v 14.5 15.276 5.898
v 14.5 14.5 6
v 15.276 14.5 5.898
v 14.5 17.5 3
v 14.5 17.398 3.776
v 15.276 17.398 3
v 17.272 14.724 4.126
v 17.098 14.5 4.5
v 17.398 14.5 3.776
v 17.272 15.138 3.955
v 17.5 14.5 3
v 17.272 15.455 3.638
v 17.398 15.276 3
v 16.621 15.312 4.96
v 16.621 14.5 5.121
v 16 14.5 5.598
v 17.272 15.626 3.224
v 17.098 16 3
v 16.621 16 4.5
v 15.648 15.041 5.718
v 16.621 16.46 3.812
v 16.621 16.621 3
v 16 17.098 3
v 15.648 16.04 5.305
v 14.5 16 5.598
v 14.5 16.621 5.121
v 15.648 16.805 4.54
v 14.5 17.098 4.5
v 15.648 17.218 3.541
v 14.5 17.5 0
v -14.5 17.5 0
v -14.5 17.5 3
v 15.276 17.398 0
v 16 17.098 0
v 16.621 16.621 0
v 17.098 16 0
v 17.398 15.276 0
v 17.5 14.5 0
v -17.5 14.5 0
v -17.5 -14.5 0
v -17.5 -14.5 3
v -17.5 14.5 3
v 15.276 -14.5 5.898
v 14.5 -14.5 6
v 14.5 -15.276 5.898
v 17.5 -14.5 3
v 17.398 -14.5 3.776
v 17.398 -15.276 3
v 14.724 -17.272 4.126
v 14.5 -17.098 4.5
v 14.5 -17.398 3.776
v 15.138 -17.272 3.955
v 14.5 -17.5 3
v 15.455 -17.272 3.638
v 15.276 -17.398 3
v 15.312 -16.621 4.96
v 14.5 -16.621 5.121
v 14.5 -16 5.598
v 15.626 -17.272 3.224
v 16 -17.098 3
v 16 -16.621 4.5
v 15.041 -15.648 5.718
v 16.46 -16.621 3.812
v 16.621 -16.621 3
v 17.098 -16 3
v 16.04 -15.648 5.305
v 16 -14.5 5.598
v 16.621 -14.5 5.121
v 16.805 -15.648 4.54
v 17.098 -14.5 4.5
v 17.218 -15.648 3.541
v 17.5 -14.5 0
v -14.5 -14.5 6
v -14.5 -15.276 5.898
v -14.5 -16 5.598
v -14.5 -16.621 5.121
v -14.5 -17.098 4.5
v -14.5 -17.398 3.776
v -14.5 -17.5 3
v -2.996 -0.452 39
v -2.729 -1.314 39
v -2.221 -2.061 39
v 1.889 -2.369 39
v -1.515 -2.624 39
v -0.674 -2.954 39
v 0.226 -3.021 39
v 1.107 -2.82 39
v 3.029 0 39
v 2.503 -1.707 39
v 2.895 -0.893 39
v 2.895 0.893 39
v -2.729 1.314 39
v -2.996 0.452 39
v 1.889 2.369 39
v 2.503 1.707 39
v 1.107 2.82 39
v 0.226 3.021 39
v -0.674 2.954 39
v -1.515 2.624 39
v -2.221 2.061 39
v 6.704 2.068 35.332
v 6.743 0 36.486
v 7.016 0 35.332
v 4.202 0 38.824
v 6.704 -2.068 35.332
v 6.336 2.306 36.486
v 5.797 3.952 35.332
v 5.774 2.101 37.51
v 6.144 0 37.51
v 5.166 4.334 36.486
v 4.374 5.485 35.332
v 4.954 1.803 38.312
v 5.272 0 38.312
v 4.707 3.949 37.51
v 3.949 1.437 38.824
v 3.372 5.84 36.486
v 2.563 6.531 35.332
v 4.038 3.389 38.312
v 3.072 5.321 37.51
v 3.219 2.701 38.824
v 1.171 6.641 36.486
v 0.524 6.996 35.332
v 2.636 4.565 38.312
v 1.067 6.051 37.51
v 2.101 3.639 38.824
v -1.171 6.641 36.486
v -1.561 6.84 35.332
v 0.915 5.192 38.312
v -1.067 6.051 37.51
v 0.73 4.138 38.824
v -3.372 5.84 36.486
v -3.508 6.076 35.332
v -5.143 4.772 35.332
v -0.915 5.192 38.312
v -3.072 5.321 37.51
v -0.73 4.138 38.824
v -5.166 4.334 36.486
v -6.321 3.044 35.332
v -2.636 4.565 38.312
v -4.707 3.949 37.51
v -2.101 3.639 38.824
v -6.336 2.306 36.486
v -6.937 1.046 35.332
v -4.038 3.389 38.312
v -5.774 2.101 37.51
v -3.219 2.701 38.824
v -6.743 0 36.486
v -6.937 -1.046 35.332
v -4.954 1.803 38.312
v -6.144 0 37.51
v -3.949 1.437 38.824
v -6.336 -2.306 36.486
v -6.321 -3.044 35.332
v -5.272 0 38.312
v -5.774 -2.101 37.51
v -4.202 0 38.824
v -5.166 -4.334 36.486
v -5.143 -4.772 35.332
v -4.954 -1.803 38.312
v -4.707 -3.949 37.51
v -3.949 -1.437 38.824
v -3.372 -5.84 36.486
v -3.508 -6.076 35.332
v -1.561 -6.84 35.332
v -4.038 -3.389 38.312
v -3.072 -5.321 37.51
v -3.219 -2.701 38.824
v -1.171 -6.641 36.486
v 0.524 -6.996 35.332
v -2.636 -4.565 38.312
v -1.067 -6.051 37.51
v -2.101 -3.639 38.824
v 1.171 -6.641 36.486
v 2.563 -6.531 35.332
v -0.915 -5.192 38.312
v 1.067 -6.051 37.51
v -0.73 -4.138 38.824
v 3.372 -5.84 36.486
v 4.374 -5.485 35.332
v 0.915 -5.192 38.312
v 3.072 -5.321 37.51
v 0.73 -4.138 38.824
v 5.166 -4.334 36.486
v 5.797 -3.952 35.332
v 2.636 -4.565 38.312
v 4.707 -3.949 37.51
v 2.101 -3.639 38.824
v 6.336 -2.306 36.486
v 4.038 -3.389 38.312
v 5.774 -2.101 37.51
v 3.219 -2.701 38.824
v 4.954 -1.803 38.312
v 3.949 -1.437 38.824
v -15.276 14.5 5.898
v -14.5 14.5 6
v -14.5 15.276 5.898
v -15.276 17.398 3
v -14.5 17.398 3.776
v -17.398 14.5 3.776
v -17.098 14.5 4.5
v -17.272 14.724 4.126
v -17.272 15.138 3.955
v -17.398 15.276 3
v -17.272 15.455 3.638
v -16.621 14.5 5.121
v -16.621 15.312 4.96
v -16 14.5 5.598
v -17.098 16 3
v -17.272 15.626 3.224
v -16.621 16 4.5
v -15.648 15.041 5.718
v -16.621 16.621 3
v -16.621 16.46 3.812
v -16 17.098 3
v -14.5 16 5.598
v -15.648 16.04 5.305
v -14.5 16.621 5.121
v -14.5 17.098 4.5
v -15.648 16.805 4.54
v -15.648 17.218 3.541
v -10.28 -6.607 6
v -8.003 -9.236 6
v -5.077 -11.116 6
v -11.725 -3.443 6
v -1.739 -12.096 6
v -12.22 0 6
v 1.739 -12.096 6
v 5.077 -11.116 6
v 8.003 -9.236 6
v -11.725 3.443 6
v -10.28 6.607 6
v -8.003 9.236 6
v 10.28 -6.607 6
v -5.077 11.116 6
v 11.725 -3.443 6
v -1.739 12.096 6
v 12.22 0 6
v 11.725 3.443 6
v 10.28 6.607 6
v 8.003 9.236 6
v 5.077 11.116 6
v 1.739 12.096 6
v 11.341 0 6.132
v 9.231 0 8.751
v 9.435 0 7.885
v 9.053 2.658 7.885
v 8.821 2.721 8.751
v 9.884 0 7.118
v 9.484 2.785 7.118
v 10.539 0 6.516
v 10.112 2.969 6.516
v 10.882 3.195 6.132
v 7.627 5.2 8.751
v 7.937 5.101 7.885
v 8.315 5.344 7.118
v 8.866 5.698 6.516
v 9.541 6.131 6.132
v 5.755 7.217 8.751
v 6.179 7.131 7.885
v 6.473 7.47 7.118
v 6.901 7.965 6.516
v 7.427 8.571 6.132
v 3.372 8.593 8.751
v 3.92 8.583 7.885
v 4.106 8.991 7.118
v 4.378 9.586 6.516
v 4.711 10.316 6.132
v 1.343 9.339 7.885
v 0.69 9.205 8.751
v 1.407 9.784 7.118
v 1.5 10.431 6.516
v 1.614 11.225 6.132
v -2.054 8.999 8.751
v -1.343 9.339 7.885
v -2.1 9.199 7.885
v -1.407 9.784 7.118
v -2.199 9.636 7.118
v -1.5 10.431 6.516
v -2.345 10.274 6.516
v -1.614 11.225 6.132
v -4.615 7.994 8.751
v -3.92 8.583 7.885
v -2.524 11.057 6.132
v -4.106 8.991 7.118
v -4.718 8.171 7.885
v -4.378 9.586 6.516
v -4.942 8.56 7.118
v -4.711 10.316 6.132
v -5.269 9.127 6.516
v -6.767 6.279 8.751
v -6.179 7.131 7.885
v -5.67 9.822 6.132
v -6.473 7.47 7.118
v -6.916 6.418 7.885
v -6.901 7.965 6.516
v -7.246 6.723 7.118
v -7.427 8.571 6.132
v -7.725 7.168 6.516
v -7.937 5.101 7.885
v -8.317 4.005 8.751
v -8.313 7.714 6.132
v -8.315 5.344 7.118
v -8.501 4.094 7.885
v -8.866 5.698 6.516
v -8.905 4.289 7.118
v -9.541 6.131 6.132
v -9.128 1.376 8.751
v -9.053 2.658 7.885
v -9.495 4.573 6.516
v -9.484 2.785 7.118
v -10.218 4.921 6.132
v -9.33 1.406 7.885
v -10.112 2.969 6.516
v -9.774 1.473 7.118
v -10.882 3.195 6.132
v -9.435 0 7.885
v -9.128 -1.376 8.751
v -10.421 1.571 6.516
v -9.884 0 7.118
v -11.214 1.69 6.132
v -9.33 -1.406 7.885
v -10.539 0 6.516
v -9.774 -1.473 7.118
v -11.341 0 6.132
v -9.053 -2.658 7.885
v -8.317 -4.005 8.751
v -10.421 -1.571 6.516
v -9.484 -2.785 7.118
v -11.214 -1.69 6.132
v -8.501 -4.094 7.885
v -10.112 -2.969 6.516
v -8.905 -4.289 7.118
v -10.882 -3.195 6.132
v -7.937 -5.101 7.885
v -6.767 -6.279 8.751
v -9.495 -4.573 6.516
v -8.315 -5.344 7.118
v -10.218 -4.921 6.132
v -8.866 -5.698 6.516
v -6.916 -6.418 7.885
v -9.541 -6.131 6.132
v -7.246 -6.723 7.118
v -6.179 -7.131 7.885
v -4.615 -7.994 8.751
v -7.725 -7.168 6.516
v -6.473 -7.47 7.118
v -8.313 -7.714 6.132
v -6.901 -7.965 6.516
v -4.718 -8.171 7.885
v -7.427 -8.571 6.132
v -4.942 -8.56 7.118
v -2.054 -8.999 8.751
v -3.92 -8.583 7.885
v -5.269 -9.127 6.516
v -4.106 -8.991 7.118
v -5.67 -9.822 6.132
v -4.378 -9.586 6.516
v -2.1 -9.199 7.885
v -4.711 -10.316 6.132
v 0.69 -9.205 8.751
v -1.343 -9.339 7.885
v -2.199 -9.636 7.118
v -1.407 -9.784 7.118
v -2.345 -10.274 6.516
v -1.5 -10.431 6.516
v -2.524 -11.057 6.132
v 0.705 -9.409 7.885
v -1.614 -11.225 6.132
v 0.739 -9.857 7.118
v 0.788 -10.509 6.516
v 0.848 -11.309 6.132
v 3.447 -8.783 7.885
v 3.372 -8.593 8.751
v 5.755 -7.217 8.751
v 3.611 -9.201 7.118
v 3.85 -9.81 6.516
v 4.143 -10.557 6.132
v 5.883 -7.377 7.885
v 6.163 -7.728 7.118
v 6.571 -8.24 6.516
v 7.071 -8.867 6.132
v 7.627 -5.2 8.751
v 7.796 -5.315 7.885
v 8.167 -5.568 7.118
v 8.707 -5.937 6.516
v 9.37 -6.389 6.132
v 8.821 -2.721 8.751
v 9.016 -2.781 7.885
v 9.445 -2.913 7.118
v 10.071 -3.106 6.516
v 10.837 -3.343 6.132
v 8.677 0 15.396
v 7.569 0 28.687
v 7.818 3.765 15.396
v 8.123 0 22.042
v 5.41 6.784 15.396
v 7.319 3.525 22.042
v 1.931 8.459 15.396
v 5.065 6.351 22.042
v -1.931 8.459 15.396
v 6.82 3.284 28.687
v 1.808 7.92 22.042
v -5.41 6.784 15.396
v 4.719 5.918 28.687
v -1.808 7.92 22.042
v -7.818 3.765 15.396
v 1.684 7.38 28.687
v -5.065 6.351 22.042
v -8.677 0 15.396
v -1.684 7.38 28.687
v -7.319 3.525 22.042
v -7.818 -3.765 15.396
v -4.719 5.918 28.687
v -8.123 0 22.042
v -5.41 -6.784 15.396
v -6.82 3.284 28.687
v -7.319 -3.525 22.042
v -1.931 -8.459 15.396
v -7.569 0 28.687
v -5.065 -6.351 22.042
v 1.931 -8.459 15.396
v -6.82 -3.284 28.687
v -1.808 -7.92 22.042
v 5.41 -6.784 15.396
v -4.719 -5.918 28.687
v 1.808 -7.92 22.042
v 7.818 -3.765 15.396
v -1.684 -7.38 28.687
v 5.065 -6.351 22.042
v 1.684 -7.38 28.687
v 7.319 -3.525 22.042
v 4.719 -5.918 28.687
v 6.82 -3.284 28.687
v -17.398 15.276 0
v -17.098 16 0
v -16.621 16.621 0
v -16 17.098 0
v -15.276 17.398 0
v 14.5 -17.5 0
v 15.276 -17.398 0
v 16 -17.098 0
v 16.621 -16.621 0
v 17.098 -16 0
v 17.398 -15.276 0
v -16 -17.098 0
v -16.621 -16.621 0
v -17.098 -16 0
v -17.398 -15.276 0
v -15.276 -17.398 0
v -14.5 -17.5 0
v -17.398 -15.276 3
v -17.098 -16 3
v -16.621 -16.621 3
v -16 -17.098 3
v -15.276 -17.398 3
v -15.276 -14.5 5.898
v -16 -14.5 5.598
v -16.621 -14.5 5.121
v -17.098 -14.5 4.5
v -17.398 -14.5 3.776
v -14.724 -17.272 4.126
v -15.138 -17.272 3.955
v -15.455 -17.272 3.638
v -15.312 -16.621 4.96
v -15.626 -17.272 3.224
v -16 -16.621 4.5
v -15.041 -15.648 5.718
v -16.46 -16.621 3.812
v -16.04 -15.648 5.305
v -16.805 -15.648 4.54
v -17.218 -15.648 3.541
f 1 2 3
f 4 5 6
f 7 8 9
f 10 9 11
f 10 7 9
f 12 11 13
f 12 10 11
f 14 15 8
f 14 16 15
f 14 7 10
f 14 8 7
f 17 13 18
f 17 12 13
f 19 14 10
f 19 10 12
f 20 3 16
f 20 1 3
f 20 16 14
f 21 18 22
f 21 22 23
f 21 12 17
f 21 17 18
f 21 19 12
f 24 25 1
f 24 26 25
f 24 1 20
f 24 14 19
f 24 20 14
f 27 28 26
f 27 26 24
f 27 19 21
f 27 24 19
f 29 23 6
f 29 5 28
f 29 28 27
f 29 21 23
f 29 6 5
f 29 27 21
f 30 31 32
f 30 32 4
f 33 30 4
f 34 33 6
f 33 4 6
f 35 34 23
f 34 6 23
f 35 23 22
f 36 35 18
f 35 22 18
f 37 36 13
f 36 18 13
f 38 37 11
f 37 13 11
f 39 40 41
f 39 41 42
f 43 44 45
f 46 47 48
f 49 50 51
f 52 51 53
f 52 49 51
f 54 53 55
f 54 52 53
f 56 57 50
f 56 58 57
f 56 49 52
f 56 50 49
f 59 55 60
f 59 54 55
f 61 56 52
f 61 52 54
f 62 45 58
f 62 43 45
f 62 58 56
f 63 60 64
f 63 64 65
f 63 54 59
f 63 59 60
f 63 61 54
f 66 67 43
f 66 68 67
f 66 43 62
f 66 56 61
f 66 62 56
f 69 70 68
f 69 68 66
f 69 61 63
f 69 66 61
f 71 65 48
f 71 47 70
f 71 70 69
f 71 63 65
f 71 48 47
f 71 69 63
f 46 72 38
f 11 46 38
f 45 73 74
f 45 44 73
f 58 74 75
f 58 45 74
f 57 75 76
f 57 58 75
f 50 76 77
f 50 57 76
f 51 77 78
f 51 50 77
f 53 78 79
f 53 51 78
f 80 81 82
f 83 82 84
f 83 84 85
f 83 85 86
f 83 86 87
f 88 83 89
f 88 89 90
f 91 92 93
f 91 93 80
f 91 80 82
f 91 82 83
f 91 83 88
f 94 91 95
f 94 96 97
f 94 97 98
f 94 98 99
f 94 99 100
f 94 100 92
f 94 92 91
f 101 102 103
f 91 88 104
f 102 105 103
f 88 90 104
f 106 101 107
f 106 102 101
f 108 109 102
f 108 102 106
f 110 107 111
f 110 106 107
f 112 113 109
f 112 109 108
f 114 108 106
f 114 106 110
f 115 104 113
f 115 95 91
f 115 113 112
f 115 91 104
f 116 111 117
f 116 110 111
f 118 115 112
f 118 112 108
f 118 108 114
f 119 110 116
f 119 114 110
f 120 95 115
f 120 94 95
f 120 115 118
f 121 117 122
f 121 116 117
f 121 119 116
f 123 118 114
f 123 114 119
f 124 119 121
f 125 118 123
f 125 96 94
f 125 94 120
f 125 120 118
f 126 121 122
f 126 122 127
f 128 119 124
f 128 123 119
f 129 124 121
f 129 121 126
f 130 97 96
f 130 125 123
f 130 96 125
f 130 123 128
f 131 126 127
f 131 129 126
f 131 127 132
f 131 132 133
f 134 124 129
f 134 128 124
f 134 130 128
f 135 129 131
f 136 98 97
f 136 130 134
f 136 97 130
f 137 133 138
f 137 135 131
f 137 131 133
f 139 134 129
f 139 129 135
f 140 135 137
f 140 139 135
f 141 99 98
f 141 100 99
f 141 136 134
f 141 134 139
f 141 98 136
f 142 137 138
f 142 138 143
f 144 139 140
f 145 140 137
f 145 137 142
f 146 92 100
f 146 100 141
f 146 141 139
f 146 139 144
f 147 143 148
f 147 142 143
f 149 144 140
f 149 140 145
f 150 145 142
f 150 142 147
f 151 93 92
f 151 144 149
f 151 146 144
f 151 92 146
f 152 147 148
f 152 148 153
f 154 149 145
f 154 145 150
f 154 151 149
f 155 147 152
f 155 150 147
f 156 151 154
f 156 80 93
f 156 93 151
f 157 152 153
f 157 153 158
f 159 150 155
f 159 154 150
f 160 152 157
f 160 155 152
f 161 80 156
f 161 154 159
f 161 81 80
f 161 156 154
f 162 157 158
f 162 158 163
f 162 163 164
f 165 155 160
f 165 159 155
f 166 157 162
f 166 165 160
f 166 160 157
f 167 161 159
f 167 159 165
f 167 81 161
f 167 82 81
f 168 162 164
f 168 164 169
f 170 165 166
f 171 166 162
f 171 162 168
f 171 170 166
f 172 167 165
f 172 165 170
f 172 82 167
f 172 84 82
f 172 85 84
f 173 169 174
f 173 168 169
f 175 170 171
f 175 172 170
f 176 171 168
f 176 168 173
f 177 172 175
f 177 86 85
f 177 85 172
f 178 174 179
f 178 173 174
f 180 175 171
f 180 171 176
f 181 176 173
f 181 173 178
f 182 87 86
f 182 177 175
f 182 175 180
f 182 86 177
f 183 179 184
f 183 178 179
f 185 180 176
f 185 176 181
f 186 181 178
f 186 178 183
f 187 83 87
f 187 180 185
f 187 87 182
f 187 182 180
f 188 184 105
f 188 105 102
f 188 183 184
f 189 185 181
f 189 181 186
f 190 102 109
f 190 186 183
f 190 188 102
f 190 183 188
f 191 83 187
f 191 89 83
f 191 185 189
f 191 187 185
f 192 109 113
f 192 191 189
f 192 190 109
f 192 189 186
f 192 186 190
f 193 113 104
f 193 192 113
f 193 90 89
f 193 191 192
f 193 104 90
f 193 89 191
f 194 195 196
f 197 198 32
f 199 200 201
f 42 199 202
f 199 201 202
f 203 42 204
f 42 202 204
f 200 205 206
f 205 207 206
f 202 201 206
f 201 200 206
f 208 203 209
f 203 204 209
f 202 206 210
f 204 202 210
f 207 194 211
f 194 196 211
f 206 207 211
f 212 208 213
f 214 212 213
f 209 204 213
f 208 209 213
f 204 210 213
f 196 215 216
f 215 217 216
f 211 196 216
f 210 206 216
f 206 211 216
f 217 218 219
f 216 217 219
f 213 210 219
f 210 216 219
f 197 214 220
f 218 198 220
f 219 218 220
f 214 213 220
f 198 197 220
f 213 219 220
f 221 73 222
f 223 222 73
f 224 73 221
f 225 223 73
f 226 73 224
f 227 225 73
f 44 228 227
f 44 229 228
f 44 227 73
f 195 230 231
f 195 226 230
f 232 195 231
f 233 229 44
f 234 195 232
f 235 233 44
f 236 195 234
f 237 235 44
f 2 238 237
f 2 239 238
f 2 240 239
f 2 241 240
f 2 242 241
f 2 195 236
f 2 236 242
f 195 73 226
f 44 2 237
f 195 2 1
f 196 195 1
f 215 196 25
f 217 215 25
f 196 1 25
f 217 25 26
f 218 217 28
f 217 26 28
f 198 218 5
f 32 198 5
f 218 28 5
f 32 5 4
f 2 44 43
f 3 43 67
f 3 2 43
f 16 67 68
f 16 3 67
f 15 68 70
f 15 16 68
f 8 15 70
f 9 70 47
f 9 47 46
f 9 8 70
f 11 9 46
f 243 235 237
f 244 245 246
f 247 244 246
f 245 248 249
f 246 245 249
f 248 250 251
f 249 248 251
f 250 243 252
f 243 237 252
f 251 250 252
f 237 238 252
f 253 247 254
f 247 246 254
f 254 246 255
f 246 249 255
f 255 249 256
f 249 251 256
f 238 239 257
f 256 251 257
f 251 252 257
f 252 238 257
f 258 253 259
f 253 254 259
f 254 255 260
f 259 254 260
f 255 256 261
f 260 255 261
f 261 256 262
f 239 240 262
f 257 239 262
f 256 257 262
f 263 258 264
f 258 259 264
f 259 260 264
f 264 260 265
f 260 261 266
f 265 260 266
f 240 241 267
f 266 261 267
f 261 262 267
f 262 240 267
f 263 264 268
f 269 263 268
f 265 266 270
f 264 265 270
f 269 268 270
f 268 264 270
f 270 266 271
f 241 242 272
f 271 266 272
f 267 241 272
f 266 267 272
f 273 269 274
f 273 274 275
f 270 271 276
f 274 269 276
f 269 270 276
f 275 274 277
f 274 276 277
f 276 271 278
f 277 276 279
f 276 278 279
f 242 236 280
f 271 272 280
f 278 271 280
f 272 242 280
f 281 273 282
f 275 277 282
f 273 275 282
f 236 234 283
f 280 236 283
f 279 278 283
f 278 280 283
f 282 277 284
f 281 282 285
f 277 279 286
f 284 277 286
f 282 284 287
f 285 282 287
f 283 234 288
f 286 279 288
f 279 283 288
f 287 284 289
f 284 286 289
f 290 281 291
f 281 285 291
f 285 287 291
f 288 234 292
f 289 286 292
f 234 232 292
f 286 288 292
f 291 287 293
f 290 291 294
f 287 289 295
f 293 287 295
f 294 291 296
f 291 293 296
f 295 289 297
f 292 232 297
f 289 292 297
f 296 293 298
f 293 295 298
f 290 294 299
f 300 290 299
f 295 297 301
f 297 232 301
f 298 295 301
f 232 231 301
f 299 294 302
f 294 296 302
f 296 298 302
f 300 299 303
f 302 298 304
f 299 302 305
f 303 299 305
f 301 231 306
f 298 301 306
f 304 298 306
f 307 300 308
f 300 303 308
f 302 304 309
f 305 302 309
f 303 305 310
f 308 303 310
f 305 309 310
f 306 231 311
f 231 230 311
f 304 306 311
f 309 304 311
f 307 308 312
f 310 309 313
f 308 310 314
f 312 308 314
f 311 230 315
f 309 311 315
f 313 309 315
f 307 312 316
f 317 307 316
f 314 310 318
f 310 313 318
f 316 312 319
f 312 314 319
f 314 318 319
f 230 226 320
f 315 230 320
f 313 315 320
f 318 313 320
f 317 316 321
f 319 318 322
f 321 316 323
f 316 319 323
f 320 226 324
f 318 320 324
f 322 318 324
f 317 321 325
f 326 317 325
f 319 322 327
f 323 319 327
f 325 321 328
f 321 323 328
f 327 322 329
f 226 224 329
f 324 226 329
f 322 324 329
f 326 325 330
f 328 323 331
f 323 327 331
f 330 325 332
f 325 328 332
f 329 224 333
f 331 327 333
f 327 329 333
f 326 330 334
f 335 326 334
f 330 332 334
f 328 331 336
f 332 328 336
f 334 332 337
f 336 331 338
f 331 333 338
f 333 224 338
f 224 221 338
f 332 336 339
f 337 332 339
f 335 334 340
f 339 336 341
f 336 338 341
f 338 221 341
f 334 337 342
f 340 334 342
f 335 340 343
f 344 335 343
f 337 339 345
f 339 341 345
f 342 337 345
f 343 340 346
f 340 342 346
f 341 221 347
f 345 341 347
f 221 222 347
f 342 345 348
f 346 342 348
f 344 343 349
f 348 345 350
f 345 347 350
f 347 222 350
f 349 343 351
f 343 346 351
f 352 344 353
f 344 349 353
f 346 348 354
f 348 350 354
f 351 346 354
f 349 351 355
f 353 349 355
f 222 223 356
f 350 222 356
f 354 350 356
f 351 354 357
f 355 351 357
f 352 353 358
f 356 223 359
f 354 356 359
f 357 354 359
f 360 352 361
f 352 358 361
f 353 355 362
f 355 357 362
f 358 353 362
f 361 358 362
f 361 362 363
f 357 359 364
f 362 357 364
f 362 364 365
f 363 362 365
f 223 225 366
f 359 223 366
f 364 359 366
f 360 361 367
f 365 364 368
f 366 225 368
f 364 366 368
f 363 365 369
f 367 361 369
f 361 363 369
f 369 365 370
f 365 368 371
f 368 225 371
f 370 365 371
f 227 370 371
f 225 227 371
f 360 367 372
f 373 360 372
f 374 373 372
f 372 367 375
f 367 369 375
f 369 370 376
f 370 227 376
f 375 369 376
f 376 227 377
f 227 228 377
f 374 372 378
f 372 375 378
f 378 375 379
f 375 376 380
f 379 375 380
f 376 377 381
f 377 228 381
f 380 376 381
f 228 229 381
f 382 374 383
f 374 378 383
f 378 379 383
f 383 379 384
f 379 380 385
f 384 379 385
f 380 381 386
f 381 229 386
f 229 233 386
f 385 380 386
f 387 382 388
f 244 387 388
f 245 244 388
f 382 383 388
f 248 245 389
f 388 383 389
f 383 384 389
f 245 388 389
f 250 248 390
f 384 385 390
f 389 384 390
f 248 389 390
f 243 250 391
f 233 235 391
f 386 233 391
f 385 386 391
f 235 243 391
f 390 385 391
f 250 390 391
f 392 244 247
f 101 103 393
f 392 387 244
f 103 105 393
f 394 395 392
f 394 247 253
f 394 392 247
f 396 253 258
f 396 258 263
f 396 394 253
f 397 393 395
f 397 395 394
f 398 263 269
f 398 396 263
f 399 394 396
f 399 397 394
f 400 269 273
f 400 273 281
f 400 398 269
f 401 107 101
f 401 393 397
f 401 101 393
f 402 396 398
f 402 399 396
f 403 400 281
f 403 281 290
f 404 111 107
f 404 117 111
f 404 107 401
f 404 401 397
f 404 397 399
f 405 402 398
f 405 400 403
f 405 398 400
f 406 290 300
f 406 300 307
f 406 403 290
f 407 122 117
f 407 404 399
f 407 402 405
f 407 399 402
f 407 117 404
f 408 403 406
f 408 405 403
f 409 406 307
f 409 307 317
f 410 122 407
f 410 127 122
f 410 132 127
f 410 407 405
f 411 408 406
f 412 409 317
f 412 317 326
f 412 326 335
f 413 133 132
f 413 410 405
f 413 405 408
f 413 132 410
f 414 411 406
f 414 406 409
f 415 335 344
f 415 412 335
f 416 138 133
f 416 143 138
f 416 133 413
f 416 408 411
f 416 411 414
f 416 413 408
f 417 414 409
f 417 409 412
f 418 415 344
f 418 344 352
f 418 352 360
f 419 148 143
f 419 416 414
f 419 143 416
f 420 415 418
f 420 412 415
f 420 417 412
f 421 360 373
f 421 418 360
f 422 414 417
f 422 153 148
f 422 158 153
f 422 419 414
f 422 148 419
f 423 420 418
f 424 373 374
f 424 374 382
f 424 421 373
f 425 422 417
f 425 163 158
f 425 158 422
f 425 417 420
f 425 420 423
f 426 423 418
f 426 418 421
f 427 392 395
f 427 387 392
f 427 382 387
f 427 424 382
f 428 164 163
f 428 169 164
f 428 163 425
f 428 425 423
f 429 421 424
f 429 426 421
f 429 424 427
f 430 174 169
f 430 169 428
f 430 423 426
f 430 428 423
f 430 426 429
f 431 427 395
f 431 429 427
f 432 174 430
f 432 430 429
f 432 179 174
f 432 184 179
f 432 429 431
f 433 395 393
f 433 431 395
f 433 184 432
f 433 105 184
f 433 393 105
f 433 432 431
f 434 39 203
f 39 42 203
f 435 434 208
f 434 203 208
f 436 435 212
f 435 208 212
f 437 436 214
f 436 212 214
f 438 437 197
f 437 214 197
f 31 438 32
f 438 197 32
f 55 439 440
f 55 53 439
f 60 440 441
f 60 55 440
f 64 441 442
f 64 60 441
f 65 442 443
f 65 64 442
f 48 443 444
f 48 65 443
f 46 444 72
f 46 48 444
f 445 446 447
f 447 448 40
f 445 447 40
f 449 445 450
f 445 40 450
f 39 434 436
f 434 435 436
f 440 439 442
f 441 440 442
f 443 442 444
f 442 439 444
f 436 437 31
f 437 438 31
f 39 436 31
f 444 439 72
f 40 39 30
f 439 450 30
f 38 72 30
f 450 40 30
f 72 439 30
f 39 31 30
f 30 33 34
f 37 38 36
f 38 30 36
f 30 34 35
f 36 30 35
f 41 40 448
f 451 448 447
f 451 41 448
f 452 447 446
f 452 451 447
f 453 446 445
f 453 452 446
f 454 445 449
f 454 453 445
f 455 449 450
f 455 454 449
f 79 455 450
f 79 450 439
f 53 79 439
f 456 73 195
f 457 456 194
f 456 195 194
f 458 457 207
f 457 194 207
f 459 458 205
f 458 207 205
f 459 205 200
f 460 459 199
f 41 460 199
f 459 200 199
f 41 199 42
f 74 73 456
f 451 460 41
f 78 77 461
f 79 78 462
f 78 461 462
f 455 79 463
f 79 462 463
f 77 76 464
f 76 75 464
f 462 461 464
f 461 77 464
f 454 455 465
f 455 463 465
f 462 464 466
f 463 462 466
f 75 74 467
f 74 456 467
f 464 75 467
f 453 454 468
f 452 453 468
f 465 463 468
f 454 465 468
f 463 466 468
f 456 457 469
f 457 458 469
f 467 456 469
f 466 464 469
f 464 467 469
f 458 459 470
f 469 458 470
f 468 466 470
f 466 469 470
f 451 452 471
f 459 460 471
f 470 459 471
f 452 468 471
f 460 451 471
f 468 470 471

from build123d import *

# Parameters (mm, degrees)
F0_W     = 35
F0_H     = 35
F0_R     = 7.96
F1_DEPTH = 6
F2_R     = 9.46
F4_R     = 6.71
F6_R     = 4
F7_R     = 3


with BuildPart() as f1:
    # F0 (on Top) → F1 (new body)
    with BuildSketch(Plane.XY):
        Rectangle(F0_W, F0_H)
        Circle(F0_R, mode=Mode.SUBTRACT)
        Circle(F0_R)
    extrude(amount=F1_DEPTH)

    # F2 (on face) → F5 section 0
    with BuildSketch(Plane.XY.offset(6)):
        Circle(F2_R)
    # F4 (on offset) → F5 section 1
    with BuildSketch(Plane.XY.offset(39)):
        Circle(F4_R)
    loft()

    # F6
    f6_edges = [f1.edges().sort_by_distance(p)[0] for p in [
        (-6.71, 0, 39),
    ]]
    fillet(f6_edges, radius=F6_R)

    # F7
    f7_edges = [f1.edges().sort_by_distance(p)[0] for p in [
        (0, 17.5, 6),
        (17.5, 0, 6),
        (-17.5, 0, 6),
        (0, -17.5, 6),
        (-9.46, 0, 6),
        (-17.5, -17.5, 3),
        (-17.5, 17.5, 3),
        (17.5, -17.5, 3),
        (17.5, 17.5, 3),
    ]]
    fillet(f7_edges, radius=F7_R)


solid = f1.part
